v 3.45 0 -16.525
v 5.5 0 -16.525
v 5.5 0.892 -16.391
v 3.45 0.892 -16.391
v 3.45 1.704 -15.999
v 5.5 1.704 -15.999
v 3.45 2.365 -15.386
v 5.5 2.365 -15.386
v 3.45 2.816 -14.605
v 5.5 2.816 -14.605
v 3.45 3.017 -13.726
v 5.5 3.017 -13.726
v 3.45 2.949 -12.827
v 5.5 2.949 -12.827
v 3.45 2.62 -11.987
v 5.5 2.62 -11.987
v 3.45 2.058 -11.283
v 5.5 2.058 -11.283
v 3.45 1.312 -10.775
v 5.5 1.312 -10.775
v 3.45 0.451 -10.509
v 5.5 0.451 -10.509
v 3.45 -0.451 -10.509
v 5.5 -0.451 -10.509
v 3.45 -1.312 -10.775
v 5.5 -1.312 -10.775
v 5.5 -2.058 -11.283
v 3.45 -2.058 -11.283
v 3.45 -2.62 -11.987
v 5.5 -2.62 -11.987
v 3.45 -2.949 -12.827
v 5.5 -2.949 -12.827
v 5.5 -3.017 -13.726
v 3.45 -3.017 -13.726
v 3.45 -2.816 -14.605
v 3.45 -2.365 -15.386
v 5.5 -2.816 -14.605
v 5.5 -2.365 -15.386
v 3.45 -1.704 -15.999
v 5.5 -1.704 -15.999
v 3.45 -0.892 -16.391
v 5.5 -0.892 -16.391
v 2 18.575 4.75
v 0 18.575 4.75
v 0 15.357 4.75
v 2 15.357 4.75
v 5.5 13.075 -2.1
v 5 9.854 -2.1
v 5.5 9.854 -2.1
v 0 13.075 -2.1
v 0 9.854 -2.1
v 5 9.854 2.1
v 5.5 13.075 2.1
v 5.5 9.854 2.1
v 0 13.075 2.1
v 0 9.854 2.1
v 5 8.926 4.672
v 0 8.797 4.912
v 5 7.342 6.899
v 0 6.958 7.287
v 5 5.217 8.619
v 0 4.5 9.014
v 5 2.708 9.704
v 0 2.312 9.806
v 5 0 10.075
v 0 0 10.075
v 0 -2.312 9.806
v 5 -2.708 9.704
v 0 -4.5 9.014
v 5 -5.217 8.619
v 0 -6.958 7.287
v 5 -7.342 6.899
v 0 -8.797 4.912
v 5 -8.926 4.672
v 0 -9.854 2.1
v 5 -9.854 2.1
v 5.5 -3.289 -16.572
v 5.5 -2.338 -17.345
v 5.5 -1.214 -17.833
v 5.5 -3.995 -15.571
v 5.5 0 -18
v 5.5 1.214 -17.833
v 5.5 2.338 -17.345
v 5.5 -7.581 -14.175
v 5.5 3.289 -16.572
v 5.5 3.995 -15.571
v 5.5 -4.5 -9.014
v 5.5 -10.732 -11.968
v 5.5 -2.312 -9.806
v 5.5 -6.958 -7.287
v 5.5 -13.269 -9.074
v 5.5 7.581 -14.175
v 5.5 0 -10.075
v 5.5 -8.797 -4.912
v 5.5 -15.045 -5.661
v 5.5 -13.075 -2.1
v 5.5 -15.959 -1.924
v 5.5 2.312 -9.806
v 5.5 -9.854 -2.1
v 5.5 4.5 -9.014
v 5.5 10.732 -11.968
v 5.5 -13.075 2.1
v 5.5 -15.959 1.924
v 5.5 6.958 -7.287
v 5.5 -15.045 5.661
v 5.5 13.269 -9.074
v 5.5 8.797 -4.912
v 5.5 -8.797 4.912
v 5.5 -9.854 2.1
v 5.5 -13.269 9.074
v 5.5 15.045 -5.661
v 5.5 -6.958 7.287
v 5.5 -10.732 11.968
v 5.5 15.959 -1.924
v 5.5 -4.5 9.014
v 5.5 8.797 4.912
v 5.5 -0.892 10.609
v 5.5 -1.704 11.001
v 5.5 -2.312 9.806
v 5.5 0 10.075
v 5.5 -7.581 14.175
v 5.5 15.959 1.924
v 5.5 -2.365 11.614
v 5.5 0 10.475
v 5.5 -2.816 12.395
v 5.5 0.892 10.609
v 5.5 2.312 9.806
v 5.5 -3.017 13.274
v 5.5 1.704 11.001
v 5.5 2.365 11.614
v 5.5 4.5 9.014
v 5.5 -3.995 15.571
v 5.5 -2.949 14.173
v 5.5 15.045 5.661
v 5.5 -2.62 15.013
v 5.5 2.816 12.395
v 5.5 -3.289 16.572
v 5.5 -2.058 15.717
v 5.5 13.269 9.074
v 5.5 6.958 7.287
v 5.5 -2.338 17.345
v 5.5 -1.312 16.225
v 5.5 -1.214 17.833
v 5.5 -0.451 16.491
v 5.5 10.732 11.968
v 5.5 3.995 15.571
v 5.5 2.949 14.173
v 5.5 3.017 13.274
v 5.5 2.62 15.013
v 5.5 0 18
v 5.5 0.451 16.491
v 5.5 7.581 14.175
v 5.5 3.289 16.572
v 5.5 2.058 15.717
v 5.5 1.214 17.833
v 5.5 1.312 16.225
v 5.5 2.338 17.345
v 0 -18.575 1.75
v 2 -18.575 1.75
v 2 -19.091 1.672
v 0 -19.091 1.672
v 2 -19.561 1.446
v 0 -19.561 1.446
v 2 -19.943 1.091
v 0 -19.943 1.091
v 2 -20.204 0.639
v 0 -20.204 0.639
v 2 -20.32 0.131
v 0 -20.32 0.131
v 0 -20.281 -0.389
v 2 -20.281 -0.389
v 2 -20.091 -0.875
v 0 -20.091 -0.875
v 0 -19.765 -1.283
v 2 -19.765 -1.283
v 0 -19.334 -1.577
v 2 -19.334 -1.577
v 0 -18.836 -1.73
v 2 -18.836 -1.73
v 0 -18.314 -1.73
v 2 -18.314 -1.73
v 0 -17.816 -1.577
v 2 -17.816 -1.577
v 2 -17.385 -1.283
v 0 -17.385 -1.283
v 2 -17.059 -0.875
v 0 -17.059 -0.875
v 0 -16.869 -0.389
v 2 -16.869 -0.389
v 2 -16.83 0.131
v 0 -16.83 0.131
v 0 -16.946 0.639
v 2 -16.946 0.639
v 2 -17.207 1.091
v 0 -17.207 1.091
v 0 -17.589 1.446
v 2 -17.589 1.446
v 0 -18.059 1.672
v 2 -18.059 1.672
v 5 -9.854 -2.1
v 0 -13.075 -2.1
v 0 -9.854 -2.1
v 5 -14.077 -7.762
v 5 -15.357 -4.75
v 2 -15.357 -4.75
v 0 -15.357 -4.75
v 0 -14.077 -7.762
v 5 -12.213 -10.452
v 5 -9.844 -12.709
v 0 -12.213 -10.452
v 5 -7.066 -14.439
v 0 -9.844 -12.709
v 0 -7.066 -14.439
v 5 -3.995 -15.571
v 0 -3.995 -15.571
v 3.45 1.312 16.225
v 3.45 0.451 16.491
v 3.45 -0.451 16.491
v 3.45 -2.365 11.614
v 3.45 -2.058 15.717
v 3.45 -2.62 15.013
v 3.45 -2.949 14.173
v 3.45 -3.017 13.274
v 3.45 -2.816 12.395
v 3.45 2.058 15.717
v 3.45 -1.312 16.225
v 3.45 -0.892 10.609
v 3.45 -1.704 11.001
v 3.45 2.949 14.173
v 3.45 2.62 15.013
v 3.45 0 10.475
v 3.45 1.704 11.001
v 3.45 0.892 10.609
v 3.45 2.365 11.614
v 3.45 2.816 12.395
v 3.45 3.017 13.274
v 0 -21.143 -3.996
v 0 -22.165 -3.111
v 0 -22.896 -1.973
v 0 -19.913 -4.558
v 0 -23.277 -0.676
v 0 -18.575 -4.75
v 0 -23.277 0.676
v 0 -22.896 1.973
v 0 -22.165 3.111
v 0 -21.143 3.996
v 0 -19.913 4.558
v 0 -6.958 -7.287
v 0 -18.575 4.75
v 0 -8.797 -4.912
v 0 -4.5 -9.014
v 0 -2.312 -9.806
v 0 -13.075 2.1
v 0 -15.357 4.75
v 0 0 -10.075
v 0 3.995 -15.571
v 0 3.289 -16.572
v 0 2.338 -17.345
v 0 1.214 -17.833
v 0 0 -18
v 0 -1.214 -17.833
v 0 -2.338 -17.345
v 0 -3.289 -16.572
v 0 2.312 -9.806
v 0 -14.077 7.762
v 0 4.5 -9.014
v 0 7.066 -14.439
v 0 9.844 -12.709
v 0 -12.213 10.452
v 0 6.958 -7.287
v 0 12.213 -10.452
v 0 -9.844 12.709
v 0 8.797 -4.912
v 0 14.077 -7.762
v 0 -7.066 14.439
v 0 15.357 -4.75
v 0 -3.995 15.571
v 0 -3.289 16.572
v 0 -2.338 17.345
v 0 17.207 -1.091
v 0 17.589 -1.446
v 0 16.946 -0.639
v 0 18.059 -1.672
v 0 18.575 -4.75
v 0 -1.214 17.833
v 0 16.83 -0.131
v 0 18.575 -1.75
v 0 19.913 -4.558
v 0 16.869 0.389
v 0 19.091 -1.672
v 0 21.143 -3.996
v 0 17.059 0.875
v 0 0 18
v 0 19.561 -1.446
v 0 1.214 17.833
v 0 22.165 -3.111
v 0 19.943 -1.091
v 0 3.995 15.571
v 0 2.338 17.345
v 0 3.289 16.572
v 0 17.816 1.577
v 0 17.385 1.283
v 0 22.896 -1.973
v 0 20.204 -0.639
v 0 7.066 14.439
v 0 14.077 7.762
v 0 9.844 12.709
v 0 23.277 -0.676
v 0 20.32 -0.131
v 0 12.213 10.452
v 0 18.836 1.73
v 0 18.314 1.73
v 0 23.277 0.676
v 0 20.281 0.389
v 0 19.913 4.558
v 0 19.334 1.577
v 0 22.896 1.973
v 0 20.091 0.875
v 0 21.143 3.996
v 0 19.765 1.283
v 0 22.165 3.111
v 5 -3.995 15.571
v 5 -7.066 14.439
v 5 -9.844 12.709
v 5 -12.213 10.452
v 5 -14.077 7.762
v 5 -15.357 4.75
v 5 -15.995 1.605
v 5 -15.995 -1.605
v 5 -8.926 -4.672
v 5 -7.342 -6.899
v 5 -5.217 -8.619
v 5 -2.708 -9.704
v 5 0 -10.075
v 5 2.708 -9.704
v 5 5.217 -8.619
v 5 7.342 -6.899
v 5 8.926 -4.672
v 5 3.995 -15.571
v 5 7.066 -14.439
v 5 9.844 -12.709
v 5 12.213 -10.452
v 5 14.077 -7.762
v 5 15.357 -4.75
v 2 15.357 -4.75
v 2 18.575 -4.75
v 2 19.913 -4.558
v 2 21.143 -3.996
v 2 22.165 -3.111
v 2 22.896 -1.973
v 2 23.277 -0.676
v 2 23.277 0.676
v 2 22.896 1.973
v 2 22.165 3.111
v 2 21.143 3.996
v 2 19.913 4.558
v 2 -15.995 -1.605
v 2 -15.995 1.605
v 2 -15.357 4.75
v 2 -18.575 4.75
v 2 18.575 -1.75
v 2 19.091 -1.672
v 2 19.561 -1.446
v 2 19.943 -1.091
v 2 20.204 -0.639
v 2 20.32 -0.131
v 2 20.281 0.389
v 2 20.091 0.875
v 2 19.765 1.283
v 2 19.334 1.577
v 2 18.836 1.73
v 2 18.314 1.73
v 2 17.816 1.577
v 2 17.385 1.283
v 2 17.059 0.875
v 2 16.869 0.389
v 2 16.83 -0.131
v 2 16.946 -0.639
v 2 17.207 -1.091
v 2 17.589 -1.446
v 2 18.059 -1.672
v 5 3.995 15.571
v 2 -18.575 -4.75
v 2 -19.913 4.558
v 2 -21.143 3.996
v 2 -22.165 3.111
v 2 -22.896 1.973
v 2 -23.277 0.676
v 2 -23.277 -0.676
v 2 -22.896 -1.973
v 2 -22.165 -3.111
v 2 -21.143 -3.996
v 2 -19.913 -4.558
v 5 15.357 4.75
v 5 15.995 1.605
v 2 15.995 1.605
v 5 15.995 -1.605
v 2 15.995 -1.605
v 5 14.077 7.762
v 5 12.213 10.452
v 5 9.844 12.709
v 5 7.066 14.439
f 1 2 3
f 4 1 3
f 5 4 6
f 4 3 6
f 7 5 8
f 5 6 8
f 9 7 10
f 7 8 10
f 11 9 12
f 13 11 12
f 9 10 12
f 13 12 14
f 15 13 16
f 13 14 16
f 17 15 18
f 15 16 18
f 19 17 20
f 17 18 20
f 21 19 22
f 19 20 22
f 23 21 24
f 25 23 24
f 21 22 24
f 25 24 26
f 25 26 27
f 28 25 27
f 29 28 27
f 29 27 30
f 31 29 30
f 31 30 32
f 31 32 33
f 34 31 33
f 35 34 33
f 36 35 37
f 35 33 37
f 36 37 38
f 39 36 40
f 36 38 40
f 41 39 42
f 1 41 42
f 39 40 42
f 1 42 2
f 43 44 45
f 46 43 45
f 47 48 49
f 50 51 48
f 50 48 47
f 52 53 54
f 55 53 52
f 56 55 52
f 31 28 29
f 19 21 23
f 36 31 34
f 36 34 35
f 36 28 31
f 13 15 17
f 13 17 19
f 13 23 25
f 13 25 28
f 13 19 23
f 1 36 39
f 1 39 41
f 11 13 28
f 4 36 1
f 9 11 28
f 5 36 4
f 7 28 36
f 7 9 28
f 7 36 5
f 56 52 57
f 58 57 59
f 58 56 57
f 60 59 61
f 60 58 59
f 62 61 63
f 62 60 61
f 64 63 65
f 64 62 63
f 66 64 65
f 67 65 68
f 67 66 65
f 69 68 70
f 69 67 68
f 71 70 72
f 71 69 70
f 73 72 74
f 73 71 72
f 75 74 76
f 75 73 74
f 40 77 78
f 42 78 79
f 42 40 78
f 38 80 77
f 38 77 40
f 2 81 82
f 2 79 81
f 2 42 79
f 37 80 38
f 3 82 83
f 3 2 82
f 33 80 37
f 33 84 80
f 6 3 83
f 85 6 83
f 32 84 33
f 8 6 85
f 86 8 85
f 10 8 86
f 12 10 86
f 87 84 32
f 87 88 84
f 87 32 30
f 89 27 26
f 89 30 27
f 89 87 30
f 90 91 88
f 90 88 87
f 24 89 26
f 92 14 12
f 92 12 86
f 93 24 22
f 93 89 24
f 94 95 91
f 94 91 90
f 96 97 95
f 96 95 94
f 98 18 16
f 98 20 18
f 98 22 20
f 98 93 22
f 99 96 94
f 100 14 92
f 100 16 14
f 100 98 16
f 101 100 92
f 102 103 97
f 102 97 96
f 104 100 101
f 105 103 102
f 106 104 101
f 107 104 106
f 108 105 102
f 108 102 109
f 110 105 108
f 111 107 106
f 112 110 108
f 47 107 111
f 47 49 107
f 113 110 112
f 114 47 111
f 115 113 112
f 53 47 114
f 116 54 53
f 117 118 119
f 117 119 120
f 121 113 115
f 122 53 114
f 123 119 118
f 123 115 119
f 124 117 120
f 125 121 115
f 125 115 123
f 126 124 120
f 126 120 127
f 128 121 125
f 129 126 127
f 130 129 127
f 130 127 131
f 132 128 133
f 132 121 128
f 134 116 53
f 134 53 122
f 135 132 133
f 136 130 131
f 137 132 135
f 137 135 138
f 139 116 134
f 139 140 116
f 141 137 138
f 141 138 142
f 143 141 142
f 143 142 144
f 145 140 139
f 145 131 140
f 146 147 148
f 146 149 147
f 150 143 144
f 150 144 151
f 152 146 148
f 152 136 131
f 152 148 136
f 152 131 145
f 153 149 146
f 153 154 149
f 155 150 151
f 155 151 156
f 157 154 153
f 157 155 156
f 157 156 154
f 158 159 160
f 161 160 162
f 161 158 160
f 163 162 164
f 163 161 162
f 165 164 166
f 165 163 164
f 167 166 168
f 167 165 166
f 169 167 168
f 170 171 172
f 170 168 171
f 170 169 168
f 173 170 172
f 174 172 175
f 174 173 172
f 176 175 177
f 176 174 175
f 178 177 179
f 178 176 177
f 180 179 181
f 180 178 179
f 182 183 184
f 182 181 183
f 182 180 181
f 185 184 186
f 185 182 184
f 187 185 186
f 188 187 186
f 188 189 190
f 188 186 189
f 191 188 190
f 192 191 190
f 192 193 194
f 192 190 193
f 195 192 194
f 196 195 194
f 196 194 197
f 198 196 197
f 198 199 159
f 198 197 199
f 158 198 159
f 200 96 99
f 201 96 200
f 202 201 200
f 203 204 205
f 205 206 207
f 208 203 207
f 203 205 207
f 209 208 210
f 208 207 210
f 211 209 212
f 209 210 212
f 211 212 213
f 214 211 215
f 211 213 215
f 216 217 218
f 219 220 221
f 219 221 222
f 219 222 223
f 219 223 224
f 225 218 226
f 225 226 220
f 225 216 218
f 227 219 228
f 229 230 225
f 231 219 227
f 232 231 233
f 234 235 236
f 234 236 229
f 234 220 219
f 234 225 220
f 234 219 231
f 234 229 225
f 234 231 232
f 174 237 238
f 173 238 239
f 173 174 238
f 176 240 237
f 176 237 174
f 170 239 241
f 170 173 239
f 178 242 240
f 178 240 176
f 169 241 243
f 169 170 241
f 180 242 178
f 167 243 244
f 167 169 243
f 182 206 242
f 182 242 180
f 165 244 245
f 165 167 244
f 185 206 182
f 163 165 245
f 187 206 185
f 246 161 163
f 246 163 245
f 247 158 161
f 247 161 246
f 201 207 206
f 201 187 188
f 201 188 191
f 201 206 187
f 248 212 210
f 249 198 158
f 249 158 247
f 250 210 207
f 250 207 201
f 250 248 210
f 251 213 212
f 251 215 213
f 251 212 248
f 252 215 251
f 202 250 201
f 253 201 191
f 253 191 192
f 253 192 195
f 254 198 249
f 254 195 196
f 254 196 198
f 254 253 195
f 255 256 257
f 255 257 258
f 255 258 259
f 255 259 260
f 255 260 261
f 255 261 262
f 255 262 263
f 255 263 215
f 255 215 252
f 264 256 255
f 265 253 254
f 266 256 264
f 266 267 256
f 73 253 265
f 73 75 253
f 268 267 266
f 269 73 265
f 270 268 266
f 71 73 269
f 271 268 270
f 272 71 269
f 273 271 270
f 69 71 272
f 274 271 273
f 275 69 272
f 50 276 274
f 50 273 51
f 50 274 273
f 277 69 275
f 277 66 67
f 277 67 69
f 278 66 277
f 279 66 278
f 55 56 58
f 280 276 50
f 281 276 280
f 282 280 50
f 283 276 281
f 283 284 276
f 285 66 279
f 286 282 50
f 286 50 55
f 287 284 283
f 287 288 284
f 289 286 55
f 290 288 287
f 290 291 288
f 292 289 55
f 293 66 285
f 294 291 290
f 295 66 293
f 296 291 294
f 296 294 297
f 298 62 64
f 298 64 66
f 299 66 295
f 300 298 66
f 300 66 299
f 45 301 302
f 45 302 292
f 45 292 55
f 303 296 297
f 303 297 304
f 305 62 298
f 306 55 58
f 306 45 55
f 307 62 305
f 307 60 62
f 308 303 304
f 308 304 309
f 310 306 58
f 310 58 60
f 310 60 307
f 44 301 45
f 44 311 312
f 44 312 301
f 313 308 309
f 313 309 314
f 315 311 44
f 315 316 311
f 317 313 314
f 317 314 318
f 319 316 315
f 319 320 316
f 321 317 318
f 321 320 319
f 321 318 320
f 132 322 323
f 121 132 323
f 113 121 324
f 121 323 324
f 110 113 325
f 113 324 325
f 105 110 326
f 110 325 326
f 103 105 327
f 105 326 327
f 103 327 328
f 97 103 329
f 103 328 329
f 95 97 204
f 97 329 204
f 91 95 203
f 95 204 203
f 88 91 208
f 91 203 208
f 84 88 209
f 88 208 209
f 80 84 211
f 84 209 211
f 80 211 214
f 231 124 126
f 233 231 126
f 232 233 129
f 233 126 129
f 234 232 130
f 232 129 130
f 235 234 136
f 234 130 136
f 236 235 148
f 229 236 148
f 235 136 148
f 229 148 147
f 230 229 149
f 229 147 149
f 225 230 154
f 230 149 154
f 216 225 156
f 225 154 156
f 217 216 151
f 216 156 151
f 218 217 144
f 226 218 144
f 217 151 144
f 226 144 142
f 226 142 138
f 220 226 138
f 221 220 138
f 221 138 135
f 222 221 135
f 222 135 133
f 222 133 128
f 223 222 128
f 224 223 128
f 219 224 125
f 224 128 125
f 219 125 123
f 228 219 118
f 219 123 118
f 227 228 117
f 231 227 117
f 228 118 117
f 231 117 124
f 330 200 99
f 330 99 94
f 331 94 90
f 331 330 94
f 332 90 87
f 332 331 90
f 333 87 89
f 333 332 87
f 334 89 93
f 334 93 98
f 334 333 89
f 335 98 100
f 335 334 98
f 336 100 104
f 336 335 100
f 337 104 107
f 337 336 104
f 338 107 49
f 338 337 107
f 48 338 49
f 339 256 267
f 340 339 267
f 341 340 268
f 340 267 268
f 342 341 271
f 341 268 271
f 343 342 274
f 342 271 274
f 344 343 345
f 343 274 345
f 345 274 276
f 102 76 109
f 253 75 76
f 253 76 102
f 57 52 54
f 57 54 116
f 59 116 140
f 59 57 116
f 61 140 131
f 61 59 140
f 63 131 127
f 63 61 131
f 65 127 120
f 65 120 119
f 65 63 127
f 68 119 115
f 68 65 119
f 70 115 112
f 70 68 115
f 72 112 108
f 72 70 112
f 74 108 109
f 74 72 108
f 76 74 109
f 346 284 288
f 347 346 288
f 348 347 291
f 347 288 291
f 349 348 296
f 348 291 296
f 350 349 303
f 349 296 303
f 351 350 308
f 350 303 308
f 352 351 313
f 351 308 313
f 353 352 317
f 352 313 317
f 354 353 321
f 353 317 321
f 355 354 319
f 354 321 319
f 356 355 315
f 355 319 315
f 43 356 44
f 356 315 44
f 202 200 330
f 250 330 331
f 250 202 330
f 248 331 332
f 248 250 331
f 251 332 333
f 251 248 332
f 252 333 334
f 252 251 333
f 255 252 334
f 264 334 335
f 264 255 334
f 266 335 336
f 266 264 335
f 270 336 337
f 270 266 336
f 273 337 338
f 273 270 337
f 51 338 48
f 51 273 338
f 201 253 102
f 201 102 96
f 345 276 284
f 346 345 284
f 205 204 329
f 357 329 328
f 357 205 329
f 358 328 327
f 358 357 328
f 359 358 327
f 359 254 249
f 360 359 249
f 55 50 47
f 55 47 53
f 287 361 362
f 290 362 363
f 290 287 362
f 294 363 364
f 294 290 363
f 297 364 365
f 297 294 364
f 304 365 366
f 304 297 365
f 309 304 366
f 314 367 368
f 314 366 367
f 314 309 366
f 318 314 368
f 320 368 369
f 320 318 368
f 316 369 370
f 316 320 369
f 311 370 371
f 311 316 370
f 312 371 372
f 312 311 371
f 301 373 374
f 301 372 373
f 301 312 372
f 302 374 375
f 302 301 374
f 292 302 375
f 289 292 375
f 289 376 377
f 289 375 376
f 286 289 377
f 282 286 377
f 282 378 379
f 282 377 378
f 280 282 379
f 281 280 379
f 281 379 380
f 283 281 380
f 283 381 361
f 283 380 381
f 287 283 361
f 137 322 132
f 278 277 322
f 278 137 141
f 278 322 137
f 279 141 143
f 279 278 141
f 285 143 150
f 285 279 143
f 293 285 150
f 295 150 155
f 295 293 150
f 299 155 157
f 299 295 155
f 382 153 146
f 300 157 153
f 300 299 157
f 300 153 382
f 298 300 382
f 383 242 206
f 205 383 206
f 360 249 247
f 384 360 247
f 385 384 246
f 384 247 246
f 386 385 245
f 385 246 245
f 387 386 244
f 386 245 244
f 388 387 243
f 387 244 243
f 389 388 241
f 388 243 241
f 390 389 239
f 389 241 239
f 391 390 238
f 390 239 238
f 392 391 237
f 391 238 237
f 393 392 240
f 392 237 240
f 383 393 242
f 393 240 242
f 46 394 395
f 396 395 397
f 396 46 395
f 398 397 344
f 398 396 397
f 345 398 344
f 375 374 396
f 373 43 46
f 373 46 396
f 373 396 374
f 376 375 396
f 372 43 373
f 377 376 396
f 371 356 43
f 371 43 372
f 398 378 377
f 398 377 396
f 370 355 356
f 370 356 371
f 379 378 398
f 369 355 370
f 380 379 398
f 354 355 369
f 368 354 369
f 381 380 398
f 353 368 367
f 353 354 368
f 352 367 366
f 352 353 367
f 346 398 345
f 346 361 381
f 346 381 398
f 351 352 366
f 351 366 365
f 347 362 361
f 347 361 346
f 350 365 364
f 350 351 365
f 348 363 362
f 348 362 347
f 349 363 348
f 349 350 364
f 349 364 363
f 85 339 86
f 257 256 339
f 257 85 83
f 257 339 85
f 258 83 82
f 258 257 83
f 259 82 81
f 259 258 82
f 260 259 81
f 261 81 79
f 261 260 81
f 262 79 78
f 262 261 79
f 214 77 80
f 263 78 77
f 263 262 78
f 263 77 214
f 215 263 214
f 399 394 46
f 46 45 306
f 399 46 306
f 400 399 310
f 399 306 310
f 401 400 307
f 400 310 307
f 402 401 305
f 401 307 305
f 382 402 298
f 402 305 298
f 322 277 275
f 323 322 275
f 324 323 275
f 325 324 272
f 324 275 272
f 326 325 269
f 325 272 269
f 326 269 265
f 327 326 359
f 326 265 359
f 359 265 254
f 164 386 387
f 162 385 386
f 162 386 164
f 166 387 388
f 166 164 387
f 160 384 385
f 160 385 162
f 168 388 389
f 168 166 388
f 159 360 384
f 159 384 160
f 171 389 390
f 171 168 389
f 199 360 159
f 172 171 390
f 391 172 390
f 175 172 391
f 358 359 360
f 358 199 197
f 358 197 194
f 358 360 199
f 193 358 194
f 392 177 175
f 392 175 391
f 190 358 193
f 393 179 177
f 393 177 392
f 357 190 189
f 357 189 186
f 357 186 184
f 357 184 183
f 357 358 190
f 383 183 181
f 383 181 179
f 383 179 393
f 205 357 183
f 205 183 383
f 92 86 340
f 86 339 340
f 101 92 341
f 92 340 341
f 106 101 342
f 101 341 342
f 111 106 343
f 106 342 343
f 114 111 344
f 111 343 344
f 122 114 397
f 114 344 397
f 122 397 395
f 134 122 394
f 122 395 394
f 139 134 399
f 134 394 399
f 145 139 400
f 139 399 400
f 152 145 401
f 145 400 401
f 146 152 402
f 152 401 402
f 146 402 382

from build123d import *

# Parameters (mm, degrees)
SKETCH1_R           = 1.75
SKETCH1_R_2         = 10.075
BOSS_EXTRUDE1_DEPTH = 5
CUT_EXTRUDE1_START  = -5
SKETCH2_W           = 4.2
SKETCH2_H           = 26.15
CUT_EXTRUDE1_DEPTH  = 5
SKETCH3_R           = 16.075
BOSS_EXTRUDE2_DEPTH = 0.5
BOSS_EXTRUDE3_DEPTH = 5.5
SKETCH5_R           = 3.025
CUT_EXTRUDE2_DEPTH  = 2.05
CUT_EXTRUDE3_START  = -3
CUT_EXTRUDE3_DEPTH  = 3


with BuildPart() as part:
    # Sketch1 → Boss-Extrude1 (new body)
    with BuildSketch(Plane(origin=(0, 0, 0), x_dir=(0, 0, -1), z_dir=(1, 0, 0))):
        with BuildLine():
            Line((4.75, 15.357184801), (4.75, 18.575))
            ThreePointArc((4.75, 18.575), (0, 23.325), (-4.75, 18.575))
            Line((-4.75, 18.575), (-4.75, 15.357184801))
            ThreePointArc((-4.75, 15.357184801), (-16.075, 0), (-4.75, -15.357184801))
            Line((-4.75, -15.357184801), (-4.75, -18.575))
            ThreePointArc((-4.75, -18.575), (0, -23.325), (4.75, -18.575))
            Line((4.75, -18.575), (4.75, -15.357184801))
            ThreePointArc((4.75, -15.357184801), (16.075, 0), (4.75, 15.357184801))
        make_face()
        with Locations((0, 18.575)):
            Circle(SKETCH1_R, mode=Mode.SUBTRACT)
        Circle(SKETCH1_R_2, mode=Mode.SUBTRACT)
        with Locations(Location((0, -18.575, 0), (0, 0, 180))):
            Circle(SKETCH1_R, mode=Mode.SUBTRACT)
    extrude(amount=BOSS_EXTRUDE1_DEPTH)

    # Sketch2 → Cut-Extrude1 (cut)
    with BuildSketch(Plane.ZY.offset(CUT_EXTRUDE1_START)):
        Rectangle(SKETCH2_W, SKETCH2_H)
    extrude(amount=CUT_EXTRUDE1_DEPTH, mode=Mode.SUBTRACT)

    # Sketch3 → Boss-Extrude2 (add)
    with BuildSketch(Plane(origin=(5, 0, 0), x_dir=(0, 0, -1), z_dir=(1, 0, 0))):
        with Locations(Location((0, 0, 0), (0, 0, 107.186915706))):
            Circle(SKETCH3_R)
        with BuildLine():
            Line((-2.1, 13.075), (-2.1, 9.85371123))
            ThreePointArc((-2.1, 9.85371123), (-10.075, 0), (-2.1, -9.85371123))
            Line((-2.1, -9.85371123), (-2.1, -13.075))
            Line((-2.1, -13.075), (2.1, -13.075))
            Line((2.1, -13.075), (2.1, -9.85371123))
            ThreePointArc((2.1, -9.85371123), (10.075, 0), (2.1, 9.85371123))
            Line((2.1, 9.85371123), (2.1, 13.075))
            Line((2.1, 13.075), (-2.1, 13.075))
        make_face(mode=Mode.SUBTRACT)
    extrude(amount=BOSS_EXTRUDE2_DEPTH)

    # Sketch4 → Boss-Extrude3 (add)
    with BuildSketch(Plane.ZY):
        with BuildLine():
            Line((-13.5, -4.5), (-9.014190202, -4.5))
            ThreePointArc((-9.014190202, -4.5), (-10.075, 0), (-9.014190202, 4.5))
            Line((-9.014190202, 4.5), (-13.5, 4.5))
            ThreePointArc((-13.5, 4.5), (-18, 0), (-13.5, -4.5))
        make_face()
        with BuildLine():
            Line((13.5, 4.5), (9.014190202, 4.5))
            ThreePointArc((9.014190202, 4.5), (10.075, 0), (9.014190202, -4.5))
            Line((9.014190202, -4.5), (13.5, -4.5))
            ThreePointArc((13.5, -4.5), (18, 0), (13.5, 4.5))
        make_face()
    extrude(amount=-BOSS_EXTRUDE3_DEPTH)

    # Sketch5 → Cut-Extrude2 (cut)
    with BuildSketch(Plane(origin=(5.5, 0, 0), x_dir=(0, 0, -1), z_dir=(1, 0, 0))):
        with Locations((-13.5, 0)):
            Circle(SKETCH5_R)
        with Locations((13.5, 0)):
            Circle(SKETCH5_R)
    extrude(amount=-CUT_EXTRUDE2_DEPTH, mode=Mode.SUBTRACT)

    # Sketch6 → Cut-Extrude3 (cut)
    with BuildSketch(Plane(origin=(5, 0, 0), x_dir=(0, 0, -1), z_dir=(1, 0, 0)).offset(CUT_EXTRUDE3_START)):
        with BuildLine():
            Line((4.75, 15.357184801), (4.75, 18.575))
            ThreePointArc((4.75, 18.575), (0, 23.325), (-4.75, 18.575))
            Line((-4.75, 18.575), (-4.75, 15.357184801))
            ThreePointArc((-4.75, 15.357184801), (0, 16.075), (4.75, 15.357184801))
        make_face()
        with BuildLine():
            Line((-4.75, -15.357184801), (-4.75, -18.575))
            ThreePointArc((-4.75, -18.575), (0, -23.325), (4.75, -18.575))
            Line((4.75, -18.575), (4.75, -15.357184801))
            ThreePointArc((4.75, -15.357184801), (0, -16.075), (-4.75, -15.357184801))
        make_face()
    extrude(amount=CUT_EXTRUDE3_DEPTH, mode=Mode.SUBTRACT)


solid = part.part
